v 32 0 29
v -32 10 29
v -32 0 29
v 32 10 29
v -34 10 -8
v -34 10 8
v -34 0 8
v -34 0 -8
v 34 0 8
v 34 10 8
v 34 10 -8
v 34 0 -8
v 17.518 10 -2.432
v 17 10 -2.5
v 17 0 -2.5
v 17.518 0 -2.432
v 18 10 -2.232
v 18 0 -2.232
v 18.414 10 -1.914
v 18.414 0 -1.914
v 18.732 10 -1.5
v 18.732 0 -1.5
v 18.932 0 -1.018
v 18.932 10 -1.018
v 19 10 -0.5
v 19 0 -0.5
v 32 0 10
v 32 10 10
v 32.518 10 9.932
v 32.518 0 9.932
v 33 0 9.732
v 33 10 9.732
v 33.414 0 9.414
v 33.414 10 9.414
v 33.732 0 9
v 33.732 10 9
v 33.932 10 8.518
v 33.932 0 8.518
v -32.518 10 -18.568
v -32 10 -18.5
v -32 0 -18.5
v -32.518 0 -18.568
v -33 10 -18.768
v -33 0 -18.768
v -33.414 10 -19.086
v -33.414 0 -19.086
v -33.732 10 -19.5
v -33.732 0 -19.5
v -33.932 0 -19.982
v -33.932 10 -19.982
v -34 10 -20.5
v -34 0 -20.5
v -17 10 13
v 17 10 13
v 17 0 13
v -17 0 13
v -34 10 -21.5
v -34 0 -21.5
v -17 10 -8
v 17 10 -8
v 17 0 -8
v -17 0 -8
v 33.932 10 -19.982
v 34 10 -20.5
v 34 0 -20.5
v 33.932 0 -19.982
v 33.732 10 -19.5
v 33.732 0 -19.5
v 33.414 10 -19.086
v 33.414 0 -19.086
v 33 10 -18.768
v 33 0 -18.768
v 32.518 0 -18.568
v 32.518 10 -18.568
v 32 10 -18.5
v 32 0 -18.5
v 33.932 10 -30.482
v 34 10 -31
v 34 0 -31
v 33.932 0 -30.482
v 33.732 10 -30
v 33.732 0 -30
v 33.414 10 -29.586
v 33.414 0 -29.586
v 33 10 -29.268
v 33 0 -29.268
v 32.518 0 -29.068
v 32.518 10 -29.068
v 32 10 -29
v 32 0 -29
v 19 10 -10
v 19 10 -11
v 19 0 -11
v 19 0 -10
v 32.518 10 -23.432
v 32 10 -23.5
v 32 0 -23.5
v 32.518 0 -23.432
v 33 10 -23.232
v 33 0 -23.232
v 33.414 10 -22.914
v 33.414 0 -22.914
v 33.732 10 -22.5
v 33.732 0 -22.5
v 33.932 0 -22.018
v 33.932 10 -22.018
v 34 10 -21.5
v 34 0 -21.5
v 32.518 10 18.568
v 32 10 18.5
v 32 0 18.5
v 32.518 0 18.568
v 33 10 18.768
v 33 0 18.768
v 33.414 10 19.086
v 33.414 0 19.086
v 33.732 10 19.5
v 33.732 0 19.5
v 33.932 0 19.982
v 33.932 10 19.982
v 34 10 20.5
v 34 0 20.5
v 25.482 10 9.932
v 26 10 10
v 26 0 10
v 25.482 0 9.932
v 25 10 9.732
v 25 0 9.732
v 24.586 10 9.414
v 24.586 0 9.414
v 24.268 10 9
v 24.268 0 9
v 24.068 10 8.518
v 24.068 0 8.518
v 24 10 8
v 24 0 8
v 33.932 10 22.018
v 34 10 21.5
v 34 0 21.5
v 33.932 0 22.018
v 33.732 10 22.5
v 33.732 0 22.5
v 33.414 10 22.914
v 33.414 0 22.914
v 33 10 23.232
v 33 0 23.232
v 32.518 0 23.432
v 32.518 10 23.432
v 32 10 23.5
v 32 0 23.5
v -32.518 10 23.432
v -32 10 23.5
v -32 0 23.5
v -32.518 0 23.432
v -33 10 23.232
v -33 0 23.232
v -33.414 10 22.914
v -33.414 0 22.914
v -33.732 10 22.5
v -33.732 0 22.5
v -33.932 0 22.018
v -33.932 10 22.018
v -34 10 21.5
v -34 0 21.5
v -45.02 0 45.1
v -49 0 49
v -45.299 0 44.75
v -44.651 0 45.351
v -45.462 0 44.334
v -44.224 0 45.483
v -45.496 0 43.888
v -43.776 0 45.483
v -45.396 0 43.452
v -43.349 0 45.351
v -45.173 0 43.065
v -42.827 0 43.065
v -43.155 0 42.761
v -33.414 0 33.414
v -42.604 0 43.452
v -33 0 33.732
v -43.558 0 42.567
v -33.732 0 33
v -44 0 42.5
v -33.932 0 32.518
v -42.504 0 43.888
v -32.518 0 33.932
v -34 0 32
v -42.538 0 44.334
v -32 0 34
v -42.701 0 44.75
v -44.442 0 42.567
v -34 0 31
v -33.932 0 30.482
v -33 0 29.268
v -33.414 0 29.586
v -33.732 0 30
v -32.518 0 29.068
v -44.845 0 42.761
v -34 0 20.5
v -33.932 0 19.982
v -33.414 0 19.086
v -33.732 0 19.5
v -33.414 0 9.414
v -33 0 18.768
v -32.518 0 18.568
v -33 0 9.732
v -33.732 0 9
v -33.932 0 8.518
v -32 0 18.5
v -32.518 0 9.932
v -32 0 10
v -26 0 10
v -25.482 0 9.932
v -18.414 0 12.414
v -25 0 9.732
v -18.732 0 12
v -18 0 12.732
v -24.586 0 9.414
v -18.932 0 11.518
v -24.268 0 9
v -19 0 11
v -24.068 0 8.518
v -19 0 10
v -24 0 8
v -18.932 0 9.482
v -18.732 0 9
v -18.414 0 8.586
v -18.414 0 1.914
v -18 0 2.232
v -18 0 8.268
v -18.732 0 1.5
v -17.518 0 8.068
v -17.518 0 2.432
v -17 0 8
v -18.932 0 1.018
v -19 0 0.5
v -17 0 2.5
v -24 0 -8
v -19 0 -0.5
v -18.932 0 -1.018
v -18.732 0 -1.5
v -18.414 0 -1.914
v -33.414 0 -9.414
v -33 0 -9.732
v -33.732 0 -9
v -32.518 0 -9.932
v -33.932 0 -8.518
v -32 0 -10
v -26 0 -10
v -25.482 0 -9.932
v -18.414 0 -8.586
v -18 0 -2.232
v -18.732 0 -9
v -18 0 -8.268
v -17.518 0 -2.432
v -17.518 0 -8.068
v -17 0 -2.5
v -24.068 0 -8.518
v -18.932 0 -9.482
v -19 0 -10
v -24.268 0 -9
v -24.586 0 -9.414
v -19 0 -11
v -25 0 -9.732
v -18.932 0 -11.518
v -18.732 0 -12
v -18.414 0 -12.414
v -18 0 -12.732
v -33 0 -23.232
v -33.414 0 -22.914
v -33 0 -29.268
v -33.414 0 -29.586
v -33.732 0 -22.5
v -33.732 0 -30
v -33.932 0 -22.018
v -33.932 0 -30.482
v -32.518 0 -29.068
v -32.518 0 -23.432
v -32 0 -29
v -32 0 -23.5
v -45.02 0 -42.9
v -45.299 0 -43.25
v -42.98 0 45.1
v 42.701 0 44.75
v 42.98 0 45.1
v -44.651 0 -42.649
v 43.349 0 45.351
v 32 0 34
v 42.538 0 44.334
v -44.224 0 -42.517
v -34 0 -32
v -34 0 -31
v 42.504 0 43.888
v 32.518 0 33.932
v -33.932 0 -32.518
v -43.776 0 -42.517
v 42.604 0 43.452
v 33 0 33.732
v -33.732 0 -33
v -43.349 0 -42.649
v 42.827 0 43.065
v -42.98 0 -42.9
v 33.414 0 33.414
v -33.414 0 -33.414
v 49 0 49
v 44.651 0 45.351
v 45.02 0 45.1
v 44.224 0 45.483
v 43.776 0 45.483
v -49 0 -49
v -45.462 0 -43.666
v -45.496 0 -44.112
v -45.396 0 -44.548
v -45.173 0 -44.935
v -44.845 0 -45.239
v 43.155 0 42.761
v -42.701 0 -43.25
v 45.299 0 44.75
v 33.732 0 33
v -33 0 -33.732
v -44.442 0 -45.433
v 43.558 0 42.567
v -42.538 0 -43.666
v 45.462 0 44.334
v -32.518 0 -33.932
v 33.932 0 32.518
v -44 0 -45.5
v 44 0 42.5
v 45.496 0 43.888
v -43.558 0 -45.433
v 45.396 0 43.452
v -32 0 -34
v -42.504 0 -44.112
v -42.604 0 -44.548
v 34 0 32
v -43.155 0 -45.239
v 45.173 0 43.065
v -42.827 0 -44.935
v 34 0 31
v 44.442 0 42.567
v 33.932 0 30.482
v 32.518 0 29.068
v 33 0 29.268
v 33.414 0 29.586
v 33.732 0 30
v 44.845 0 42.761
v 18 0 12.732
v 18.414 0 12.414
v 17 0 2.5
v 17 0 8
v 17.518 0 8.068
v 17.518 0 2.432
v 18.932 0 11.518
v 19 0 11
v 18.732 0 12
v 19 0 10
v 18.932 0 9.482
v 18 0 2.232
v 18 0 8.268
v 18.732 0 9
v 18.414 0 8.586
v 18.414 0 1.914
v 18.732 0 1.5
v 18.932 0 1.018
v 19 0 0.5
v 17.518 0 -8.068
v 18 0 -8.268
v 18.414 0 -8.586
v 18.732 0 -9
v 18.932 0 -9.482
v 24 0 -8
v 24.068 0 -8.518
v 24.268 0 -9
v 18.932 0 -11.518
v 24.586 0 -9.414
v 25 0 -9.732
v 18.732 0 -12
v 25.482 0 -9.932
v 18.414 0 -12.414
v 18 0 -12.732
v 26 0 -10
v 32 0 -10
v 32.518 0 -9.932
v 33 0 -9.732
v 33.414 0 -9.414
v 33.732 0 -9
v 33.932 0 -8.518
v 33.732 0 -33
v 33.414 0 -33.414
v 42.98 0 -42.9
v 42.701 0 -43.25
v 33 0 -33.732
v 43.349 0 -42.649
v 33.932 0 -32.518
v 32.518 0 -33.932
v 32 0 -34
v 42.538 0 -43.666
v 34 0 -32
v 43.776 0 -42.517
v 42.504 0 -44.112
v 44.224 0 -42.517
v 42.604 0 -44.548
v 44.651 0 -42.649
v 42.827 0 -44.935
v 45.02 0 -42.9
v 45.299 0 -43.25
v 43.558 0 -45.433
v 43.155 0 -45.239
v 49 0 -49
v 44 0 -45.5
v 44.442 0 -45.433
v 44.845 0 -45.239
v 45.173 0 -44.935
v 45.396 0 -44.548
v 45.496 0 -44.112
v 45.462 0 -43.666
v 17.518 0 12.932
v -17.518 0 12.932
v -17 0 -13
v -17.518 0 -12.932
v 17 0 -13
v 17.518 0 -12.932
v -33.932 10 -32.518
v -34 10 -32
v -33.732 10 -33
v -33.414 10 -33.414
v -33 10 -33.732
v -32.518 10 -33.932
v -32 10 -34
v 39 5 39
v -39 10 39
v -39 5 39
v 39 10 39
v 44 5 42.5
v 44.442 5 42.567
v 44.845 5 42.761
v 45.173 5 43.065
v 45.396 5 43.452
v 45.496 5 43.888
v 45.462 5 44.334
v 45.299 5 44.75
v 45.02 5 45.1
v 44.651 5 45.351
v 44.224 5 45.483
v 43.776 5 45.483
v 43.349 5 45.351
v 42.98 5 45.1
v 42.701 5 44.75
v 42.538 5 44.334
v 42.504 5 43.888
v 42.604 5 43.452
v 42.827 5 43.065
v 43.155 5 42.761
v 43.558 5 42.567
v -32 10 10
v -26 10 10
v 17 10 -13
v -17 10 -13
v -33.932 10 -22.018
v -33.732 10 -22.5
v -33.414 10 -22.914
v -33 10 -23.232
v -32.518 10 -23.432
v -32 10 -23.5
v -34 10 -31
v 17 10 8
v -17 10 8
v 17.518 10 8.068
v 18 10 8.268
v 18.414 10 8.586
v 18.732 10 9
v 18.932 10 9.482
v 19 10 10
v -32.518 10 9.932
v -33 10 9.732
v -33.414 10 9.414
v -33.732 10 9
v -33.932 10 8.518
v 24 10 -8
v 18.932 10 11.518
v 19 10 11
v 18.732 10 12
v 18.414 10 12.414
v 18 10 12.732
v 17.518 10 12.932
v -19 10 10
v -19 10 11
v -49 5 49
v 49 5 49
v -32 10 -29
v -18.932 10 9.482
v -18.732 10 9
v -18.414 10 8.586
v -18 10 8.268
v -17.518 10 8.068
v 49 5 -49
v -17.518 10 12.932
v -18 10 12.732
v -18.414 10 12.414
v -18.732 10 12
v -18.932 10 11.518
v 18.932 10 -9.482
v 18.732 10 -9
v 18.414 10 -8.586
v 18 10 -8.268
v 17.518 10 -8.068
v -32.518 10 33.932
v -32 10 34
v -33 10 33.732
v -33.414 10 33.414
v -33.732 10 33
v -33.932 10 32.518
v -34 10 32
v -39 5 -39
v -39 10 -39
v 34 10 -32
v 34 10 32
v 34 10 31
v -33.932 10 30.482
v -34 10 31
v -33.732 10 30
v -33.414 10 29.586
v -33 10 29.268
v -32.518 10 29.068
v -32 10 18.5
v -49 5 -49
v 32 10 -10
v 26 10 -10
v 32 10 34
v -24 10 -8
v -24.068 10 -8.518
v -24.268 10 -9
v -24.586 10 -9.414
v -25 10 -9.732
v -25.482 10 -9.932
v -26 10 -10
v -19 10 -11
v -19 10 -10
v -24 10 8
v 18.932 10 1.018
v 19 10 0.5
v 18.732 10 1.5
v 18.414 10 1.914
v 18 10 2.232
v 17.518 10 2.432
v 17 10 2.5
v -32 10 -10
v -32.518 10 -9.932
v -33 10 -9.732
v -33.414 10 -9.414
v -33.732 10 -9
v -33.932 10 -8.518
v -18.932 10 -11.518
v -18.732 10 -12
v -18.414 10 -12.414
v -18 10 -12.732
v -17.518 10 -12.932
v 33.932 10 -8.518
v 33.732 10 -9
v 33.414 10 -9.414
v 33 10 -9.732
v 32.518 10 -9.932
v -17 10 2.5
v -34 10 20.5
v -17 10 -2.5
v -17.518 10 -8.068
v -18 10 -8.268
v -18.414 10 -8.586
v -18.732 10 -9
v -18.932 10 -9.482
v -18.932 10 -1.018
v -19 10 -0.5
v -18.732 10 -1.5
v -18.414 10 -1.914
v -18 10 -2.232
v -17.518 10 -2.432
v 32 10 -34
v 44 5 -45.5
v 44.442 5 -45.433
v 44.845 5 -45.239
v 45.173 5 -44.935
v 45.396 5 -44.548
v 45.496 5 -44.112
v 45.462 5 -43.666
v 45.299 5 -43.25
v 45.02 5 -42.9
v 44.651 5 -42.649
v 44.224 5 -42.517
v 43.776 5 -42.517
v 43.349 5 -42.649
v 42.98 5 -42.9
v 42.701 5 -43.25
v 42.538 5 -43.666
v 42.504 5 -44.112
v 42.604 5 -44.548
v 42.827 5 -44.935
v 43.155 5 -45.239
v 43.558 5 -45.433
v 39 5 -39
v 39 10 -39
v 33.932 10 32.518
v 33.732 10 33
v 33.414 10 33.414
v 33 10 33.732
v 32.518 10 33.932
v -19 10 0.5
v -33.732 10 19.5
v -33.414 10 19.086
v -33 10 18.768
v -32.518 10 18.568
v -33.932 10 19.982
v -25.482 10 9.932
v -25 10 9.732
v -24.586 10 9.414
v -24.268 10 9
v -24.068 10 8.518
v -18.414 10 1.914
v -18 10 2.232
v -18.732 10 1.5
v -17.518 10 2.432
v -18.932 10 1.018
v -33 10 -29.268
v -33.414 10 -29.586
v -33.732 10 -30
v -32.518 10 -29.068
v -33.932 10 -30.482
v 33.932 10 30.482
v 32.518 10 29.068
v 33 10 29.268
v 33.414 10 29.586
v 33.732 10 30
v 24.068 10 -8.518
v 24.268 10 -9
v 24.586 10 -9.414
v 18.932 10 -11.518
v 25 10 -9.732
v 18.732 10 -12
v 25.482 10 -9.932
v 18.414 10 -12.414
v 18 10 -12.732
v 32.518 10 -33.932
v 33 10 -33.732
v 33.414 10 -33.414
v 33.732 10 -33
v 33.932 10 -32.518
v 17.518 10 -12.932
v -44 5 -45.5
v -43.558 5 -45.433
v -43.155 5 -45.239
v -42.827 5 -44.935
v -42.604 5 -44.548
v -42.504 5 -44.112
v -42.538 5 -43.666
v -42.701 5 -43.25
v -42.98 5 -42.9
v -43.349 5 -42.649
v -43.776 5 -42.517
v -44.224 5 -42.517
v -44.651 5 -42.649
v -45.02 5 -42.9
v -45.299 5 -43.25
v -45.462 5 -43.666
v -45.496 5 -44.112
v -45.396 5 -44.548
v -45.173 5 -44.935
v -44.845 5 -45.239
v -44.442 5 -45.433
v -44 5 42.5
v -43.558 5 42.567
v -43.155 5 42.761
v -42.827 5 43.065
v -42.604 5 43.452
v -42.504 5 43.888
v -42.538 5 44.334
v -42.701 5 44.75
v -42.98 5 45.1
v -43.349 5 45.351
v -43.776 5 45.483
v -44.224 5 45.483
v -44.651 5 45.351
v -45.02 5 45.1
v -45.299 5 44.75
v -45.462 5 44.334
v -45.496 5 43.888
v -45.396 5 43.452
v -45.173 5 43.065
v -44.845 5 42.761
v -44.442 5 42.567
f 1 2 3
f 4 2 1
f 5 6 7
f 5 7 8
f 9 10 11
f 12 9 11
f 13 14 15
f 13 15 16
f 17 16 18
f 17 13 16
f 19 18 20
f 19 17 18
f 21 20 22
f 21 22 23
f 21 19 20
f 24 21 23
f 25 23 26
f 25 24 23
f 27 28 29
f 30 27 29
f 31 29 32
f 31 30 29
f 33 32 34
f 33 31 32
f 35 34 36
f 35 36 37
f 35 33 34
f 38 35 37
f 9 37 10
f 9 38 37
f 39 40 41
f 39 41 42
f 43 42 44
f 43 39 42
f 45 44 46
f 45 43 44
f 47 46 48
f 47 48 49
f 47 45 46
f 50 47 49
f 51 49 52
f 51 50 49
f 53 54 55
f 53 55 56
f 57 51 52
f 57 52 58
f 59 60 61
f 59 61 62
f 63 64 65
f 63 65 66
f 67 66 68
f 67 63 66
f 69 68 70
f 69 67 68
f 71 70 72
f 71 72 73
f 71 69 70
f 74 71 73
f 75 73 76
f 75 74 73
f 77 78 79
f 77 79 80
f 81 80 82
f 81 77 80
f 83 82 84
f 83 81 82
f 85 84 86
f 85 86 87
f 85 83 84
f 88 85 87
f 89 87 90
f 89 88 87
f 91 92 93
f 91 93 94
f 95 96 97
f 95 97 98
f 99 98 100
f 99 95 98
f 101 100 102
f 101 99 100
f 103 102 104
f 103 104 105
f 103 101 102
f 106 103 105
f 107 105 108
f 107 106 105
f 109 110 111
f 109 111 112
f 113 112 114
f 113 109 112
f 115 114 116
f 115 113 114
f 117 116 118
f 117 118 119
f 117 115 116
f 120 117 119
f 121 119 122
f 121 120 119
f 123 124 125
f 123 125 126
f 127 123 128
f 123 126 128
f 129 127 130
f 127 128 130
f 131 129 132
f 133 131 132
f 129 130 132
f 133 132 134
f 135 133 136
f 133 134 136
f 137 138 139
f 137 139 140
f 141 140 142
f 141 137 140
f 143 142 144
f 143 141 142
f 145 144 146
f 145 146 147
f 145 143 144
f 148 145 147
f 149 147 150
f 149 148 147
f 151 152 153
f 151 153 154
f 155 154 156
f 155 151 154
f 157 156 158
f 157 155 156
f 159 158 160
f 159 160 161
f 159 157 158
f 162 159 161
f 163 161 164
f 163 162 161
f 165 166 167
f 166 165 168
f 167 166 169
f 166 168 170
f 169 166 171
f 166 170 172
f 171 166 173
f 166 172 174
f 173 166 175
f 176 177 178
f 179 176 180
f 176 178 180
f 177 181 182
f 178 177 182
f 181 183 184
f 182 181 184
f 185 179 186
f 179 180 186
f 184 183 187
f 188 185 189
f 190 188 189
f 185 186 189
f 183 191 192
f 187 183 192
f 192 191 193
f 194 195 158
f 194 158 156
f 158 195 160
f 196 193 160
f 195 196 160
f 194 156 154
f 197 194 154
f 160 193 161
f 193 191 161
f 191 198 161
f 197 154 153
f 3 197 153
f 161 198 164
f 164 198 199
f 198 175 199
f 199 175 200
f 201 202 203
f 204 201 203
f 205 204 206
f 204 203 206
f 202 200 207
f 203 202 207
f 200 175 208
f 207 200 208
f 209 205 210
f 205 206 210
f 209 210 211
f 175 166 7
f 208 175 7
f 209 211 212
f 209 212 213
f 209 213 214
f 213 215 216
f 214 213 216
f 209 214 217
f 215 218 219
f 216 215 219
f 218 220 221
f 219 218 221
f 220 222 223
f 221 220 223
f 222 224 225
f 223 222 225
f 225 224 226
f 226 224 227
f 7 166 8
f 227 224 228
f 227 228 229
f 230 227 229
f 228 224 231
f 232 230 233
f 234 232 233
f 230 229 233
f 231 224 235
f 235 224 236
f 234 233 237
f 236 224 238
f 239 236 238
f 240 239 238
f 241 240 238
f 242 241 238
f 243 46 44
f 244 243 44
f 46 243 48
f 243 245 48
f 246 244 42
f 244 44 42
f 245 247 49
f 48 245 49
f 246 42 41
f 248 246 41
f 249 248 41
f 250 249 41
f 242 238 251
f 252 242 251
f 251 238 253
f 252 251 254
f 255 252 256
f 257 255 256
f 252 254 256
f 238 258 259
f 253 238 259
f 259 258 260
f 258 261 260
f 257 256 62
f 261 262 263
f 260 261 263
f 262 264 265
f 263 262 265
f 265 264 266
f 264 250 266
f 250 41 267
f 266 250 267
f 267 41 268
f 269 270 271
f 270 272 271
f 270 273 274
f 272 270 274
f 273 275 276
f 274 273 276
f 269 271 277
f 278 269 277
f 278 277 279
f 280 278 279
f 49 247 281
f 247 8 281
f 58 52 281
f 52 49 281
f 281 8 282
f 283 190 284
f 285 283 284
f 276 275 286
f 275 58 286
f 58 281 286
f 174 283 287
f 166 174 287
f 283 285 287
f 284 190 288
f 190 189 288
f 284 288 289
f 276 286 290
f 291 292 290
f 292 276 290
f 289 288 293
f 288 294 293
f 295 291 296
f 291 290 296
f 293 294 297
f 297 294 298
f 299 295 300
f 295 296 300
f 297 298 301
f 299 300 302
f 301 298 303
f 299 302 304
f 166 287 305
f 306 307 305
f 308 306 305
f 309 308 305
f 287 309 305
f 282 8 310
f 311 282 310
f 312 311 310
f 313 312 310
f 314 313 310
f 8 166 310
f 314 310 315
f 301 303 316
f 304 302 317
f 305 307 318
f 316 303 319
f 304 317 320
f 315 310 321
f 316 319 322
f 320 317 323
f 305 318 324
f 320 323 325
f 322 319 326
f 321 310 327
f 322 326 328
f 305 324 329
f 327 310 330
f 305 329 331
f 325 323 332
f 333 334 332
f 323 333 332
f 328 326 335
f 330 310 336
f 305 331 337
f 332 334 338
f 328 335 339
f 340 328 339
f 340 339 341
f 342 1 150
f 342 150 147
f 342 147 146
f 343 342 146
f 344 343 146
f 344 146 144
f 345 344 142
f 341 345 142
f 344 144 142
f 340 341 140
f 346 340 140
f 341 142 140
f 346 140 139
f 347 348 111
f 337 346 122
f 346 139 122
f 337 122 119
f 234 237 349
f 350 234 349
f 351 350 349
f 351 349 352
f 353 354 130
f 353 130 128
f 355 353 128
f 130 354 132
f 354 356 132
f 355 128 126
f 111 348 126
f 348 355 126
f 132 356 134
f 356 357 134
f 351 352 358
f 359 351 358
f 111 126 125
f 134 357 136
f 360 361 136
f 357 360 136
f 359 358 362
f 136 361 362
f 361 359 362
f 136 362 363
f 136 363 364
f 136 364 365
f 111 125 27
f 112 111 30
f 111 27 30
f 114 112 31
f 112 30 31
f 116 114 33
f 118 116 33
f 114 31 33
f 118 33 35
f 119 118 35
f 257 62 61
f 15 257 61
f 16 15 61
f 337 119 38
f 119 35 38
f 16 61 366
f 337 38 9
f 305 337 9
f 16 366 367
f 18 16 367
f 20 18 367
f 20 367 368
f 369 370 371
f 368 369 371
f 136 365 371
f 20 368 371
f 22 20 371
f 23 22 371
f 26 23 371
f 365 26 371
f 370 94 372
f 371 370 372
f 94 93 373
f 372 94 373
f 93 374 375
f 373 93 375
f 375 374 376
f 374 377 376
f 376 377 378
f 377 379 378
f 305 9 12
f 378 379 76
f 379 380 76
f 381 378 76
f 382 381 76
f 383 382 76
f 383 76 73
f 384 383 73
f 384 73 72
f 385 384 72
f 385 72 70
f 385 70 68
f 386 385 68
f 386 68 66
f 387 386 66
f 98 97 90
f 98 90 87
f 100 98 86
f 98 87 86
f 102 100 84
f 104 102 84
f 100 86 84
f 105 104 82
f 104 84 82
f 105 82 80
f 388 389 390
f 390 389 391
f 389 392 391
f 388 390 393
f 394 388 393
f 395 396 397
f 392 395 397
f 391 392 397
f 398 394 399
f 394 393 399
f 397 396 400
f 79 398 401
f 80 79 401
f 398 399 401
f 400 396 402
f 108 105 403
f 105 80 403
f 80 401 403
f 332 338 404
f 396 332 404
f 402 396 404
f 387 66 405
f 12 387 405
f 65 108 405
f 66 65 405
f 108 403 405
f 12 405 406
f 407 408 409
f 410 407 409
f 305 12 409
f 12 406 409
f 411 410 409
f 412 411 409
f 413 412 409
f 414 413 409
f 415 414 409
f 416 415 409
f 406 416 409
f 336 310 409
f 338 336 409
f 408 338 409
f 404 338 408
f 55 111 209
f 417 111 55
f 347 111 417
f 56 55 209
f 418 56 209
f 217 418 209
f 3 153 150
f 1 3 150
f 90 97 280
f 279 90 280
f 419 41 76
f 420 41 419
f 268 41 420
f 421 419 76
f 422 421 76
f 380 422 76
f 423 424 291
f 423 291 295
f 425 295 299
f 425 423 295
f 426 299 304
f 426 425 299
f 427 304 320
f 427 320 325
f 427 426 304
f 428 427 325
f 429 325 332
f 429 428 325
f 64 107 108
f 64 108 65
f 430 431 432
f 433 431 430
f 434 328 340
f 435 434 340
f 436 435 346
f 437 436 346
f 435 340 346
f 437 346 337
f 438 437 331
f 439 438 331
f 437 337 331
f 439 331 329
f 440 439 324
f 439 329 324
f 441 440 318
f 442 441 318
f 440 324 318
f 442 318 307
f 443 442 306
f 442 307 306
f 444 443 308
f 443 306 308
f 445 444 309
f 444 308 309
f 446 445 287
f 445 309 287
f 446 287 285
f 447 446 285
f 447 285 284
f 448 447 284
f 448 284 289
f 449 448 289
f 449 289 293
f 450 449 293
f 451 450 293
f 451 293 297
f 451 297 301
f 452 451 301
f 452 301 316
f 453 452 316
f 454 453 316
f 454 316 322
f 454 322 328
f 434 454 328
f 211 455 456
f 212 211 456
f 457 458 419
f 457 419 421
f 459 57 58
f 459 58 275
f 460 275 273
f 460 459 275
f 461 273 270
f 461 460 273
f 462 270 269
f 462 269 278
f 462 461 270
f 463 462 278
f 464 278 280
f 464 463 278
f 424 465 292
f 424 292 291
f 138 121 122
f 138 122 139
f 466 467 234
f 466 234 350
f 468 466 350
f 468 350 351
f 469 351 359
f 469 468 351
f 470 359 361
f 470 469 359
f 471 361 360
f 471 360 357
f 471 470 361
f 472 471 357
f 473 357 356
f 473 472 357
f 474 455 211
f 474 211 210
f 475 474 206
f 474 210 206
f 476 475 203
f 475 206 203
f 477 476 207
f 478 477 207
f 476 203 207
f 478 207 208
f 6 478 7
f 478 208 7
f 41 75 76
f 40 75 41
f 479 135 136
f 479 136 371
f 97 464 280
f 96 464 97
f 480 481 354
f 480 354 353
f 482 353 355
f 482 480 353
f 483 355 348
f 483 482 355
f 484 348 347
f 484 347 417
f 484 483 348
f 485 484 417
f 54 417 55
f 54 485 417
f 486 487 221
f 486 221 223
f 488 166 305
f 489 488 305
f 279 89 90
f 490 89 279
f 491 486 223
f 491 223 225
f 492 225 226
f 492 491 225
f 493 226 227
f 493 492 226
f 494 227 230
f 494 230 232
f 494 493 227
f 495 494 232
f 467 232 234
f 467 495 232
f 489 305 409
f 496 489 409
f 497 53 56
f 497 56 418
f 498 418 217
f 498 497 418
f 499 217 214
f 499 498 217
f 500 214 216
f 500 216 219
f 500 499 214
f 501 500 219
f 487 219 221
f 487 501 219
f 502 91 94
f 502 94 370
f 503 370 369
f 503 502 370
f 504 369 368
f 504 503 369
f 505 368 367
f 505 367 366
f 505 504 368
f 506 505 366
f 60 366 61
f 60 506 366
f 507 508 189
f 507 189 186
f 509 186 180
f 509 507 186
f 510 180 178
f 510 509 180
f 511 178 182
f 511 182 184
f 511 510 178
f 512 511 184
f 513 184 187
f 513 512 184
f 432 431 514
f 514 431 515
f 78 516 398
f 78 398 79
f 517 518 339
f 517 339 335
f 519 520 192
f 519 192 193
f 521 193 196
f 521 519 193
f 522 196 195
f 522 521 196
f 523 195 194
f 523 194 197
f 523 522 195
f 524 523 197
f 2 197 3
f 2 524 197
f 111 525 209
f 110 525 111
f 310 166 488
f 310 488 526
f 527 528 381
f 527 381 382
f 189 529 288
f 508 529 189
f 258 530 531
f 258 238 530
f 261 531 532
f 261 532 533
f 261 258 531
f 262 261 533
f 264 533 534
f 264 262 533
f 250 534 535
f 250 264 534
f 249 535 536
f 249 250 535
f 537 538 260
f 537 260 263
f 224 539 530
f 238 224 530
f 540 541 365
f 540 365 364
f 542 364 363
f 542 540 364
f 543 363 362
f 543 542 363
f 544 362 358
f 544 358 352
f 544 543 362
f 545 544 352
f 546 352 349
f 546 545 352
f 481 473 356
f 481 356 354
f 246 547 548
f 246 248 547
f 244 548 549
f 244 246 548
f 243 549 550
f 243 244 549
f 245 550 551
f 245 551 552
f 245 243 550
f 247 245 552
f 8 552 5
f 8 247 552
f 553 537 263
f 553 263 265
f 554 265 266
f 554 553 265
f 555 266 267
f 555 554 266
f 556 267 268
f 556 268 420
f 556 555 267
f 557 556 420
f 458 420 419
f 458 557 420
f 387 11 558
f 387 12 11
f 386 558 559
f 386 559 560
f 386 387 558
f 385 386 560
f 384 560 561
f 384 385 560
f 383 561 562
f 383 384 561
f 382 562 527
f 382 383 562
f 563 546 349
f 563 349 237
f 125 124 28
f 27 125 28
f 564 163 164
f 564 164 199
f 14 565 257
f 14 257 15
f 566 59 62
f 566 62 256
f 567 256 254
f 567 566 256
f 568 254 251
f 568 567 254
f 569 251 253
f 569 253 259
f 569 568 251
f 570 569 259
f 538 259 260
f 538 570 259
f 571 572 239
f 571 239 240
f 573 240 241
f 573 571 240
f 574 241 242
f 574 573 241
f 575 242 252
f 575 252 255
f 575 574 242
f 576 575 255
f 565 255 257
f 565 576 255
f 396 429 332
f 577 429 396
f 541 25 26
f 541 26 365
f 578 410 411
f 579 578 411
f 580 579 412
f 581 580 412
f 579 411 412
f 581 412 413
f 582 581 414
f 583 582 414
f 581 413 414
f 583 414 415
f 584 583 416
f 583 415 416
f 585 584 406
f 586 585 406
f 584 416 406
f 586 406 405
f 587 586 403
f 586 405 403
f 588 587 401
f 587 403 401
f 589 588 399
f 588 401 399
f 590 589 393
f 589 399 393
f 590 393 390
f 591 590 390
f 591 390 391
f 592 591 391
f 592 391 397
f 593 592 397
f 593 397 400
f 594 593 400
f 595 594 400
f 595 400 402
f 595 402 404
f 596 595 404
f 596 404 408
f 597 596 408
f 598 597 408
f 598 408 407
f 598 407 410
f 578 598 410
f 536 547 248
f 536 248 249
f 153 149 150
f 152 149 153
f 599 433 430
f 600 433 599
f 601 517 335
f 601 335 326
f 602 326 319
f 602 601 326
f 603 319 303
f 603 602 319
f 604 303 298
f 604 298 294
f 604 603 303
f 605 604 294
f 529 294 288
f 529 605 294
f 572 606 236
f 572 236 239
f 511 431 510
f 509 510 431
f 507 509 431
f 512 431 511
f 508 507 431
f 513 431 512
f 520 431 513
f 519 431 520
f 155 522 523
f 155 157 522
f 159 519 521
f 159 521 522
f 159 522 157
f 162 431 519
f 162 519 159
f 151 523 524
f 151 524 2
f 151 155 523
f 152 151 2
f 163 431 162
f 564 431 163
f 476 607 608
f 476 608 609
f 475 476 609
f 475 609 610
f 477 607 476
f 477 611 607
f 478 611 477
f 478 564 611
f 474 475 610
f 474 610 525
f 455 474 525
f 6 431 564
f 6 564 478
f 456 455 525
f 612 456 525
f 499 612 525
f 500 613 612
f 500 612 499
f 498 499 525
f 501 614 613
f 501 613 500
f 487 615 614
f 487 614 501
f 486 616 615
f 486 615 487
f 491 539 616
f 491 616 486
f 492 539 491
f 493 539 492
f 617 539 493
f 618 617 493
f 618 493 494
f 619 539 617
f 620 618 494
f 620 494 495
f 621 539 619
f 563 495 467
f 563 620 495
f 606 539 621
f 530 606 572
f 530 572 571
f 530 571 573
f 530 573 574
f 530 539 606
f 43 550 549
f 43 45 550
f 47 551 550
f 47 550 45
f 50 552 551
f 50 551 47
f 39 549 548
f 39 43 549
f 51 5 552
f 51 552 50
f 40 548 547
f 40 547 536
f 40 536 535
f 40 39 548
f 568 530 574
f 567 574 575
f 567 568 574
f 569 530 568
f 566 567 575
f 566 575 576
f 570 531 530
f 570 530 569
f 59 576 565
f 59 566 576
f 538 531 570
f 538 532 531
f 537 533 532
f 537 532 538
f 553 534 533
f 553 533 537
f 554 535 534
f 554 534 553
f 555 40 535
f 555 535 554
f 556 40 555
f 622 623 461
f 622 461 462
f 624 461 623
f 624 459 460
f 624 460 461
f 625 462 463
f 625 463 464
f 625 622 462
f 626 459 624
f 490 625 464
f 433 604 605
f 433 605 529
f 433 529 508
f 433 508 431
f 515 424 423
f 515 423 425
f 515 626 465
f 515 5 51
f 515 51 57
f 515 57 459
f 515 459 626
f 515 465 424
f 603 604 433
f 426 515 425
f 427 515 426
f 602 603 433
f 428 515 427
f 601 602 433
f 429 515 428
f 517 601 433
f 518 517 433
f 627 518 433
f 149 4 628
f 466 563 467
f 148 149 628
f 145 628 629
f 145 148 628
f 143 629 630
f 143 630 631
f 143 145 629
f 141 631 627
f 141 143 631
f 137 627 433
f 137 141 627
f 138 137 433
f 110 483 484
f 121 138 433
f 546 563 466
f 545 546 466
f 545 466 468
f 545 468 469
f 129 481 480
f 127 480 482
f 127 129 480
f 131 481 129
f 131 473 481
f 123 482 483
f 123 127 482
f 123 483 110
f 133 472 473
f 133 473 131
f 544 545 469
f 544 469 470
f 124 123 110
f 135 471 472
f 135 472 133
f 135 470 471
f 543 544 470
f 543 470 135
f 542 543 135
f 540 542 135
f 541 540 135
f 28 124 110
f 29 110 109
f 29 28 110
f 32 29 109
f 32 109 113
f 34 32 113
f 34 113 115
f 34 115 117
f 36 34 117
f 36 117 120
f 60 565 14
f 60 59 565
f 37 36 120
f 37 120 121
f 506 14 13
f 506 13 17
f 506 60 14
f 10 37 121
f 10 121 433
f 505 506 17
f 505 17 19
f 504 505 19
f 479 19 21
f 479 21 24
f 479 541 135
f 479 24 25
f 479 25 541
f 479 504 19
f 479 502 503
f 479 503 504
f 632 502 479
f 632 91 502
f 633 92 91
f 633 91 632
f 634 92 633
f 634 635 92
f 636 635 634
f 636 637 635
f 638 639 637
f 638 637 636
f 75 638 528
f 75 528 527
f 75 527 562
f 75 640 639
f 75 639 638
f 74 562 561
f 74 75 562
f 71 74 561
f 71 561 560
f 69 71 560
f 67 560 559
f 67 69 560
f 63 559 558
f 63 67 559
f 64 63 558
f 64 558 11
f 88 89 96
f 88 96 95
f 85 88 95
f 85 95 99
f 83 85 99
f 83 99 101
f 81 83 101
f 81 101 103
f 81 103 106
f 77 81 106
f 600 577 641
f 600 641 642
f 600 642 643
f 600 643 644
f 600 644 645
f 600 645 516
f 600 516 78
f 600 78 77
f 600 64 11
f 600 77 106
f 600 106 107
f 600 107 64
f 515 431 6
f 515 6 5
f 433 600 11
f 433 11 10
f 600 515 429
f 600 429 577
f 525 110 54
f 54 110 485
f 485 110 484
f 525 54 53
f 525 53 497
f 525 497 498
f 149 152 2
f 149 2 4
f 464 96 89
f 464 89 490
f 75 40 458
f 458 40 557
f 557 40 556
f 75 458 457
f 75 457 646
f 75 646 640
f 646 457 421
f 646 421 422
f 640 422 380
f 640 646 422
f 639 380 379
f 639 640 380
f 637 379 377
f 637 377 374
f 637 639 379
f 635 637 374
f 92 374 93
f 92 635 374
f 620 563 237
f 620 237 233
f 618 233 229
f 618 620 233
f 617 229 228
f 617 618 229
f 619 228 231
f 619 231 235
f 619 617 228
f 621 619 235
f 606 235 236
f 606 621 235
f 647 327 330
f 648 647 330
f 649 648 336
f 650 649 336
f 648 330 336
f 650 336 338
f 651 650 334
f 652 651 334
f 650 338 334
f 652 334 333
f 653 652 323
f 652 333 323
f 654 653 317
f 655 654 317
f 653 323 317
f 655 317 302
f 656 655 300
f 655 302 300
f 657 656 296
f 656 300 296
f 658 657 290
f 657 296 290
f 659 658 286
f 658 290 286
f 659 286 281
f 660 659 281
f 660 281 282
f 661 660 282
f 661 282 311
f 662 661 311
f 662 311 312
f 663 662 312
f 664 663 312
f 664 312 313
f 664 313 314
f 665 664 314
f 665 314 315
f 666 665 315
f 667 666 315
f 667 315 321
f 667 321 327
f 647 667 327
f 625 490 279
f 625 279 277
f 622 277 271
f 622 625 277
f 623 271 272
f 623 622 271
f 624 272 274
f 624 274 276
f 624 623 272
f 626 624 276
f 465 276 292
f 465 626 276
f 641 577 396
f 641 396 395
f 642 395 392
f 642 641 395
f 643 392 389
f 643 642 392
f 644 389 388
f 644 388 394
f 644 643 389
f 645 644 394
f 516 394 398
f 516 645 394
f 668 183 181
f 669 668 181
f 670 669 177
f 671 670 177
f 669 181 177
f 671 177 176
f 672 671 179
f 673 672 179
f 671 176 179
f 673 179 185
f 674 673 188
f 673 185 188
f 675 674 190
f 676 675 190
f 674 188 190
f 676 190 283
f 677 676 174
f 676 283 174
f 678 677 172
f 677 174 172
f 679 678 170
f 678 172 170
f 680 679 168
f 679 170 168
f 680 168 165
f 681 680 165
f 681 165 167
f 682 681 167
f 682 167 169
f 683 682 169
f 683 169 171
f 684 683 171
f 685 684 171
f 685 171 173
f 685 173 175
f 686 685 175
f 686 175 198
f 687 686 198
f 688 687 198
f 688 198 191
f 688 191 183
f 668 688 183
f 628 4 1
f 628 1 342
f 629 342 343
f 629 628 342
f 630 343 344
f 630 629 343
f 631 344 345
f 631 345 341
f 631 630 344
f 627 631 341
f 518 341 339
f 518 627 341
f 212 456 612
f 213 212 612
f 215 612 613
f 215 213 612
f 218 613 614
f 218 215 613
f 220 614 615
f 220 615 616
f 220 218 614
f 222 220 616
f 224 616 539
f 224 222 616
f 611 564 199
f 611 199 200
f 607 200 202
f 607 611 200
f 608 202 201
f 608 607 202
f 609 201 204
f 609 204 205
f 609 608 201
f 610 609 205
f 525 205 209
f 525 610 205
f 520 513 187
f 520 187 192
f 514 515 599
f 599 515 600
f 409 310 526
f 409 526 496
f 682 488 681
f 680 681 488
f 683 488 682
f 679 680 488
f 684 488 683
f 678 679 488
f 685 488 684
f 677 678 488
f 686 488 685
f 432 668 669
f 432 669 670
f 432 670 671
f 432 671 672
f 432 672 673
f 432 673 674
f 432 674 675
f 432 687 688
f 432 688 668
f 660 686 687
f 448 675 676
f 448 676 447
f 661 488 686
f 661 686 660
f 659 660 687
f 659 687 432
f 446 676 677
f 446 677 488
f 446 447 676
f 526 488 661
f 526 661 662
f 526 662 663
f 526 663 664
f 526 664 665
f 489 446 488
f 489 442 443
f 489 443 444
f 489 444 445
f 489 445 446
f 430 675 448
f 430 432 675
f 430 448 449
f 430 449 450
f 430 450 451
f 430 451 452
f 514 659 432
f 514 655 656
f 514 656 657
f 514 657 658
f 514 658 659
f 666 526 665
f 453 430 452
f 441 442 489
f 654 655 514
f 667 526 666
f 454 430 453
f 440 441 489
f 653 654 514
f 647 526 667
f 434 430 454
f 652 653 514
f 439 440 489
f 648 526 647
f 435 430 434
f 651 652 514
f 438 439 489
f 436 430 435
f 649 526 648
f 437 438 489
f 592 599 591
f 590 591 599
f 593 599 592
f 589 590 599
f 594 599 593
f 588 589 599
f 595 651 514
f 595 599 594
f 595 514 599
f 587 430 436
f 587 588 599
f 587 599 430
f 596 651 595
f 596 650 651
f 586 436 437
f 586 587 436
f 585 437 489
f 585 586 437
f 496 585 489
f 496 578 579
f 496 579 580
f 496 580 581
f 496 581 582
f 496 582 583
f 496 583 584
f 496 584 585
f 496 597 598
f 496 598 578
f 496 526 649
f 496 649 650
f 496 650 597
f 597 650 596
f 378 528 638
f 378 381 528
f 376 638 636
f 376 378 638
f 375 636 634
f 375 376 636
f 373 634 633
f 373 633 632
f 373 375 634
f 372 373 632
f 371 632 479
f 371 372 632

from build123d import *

# Parameters (mm, degrees)
SKETCH1_W           = 98
SKETCH1_H           = 98
BOSS_EXTRUDE1_DEPTH = 10
SKETCH8_W           = 98
SKETCH8_H           = 98
SKETCH8_W_2         = 78
SKETCH8_H_2         = 78
CUT_EXTRUDE5_DEPTH  = 5
SKETCH14_R          = 1.5
CUT_EXTRUDE11_DEPTH = 10
SKETCH15_W          = 10
SKETCH15_H          = 20
CUT_EXTRUDE19_DEPTH = 10
FILLET1_R           = 2


with BuildPart() as part:
    # Sketch1 → Boss-Extrude1 (new body)
    with BuildSketch(Plane(origin=(0, 0, 0), x_dir=(1, 0, 0), z_dir=(0, 1, 0))):
        Rectangle(SKETCH1_W, SKETCH1_H)
    extrude(amount=BOSS_EXTRUDE1_DEPTH)

    # Sketch8 → Cut-Extrude5 (cut)
    with BuildSketch(Plane(origin=(0, 10, 0), x_dir=(1, 0, 0), z_dir=(0, 1, 0))):
        Rectangle(SKETCH8_W, SKETCH8_H)
        Rectangle(SKETCH8_W_2, SKETCH8_H_2, mode=Mode.SUBTRACT)
    extrude(amount=-CUT_EXTRUDE5_DEPTH, mode=Mode.SUBTRACT)

    # Sketch14 → Cut-Extrude11 (cut)
    with BuildSketch(Plane.XZ):
        with Locations(Location((-44, -44, 0), (0, 0, 270))):
            Circle(SKETCH14_R)
        with Locations(Location((-44, 44, 0), (0, 0, 270))):
            Circle(SKETCH14_R)
        with Locations(Location((44, 44, 0), (0, 0, 270))):
            Circle(SKETCH14_R)
        with Locations(Location((44, -44, 0), (0, 0, 270))):
            Circle(SKETCH14_R)
    extrude(amount=-CUT_EXTRUDE11_DEPTH, mode=Mode.SUBTRACT)

    # Sketch15 → Cut-Extrude19 (cut)
    with BuildSketch(Plane(origin=(0, 10, 0), x_dir=(1, 0, 0), z_dir=(0, 1, 0))):
        with BuildLine():
            ThreePointArc((-34, 32), (-33.414213562, 33.414213562), (-32, 34))
            Line((-32, 34), (32, 34))
            ThreePointArc((32, 34), (33.414213562, 33.414213562), (34, 32))
            Line((34, 32), (34, 31))
            ThreePointArc((34, 31), (33.414213562, 29.585786438), (32, 29))
            Line((32, 29), (14, 29))
            Line((14, 29), (-14, 29))
            Line((-14, 29), (-32, 29))
            ThreePointArc((-32, 29), (-33.414213562, 29.585786438), (-34, 31))
            Line((-34, 31), (-34, 32))
        make_face()
        with BuildLine():
            ThreePointArc((-34, 21.5), (-33.414213562, 22.914213562), (-32, 23.5))
            Line((-32, 23.5), (-14, 23.5))
            Line((-14, 23.5), (14, 23.5))
            Line((14, 23.5), (32, 23.5))
            ThreePointArc((32, 23.5), (33.414213562, 22.914213562), (34, 21.5))
            Line((34, 21.5), (34, 20.5))
            ThreePointArc((34, 20.5), (33.414213562, 19.085786438), (32, 18.5))
            Line((32, 18.5), (14, 18.5))
            Line((14, 18.5), (-14, 18.5))
            Line((-14, 18.5), (-32, 18.5))
            ThreePointArc((-32, 18.5), (-33.414213562, 19.085786438), (-34, 20.5))
            Line((-34, 20.5), (-34, 21.5))
        make_face()
        with BuildLine():
            ThreePointArc((-19, 11), (-18.414213562, 12.414213562), (-17, 13))
            Line((-17, 13), (-14, 13))
            Line((-14, 13), (14, 13))
            Line((14, 13), (17, 13))
            ThreePointArc((17, 13), (18.414213562, 12.414213562), (19, 11))
            Line((19, 11), (19, 10))
            ThreePointArc((19, 10), (18.414213562, 8.585786438), (17, 8))
            Line((17, 8), (14, 8))
            Line((14, 8), (-14, 8))
            Line((-14, 8), (-17, 8))
            ThreePointArc((-17, 8), (-18.414213562, 8.585786438), (-19, 10))
            Line((-19, 10), (-19, 11))
        make_face()
        with BuildLine():
            ThreePointArc((-19, 0.5), (-18.414213562, 1.914213562), (-17, 2.5))
            Line((-17, 2.5), (-14, 2.5))
            Line((-14, 2.5), (14, 2.5))
            Line((14, 2.5), (17, 2.5))
            ThreePointArc((17, 2.5), (18.414213562, 1.914213562), (19, 0.5))
            Line((19, 0.5), (19, -0.5))
            ThreePointArc((19, -0.5), (18.414213562, -1.914213562), (17, -2.5))
            Line((17, -2.5), (14, -2.5))
            Line((14, -2.5), (-14, -2.5))
            Line((-14, -2.5), (-17, -2.5))
            ThreePointArc((-17, -2.5), (-18.414213562, -1.914213562), (-19, -0.5))
            Line((-19, -0.5), (-19, 0.5))
        make_face()
        with BuildLine():
            ThreePointArc((-19, -10), (-18.414213562, -8.585786438), (-17, -8))
            Line((-17, -8), (-14, -8))
            Line((-14, -8), (14, -8))
            Line((14, -8), (17, -8))
            ThreePointArc((17, -8), (18.414213562, -8.585786438), (19, -10))
            Line((19, -10), (19, -11))
            ThreePointArc((19, -11), (18.414213562, -12.414213562), (17, -13))
            Line((17, -13), (14, -13))
            Line((14, -13), (-14, -13))
            Line((-14, -13), (-17, -13))
            ThreePointArc((-17, -13), (-18.414213562, -12.414213562), (-19, -11))
            Line((-19, -11), (-19, -10))
        make_face()
        with BuildLine():
            ThreePointArc((32, -18.5), (33.414213562, -19.085786438), (34, -20.5))
            Line((34, -20.5), (34, -21.5))
            ThreePointArc((34, -21.5), (33.414213562, -22.914213562), (32, -23.5))
            Line((32, -23.5), (14, -23.5))
            Line((14, -23.5), (-14, -23.5))
            Line((-14, -23.5), (-32, -23.5))
            ThreePointArc((-32, -23.5), (-33.414213562, -22.914213562), (-34, -21.5))
            Line((-34, -21.5), (-34, -20.5))
            ThreePointArc((-34, -20.5), (-33.414213562, -19.085786438), (-32, -18.5))
            Line((-32, -18.5), (-14, -18.5))
            Line((-14, -18.5), (14, -18.5))
            Line((14, -18.5), (32, -18.5))
        make_face()
        with BuildLine():
            ThreePointArc((32, -29), (33.414213562, -29.585786438), (34, -31))
            Line((34, -31), (34, -32))
            ThreePointArc((34, -32), (33.414213562, -33.414213562), (32, -34))
            Line((32, -34), (-32, -34))
            ThreePointArc((-32, -34), (-33.414213562, -33.414213562), (-34, -32))
            Line((-34, -32), (-34, -31))
            ThreePointArc((-34, -31), (-33.414213562, -29.585786438), (-32, -29))
            Line((-32, -29), (-14, -29))
            Line((-14, -29), (14, -29))
            Line((14, -29), (32, -29))
        make_face()
        with Locations((-29, 0)):
            Rectangle(SKETCH15_W, SKETCH15_H)
        with Locations((29, 0)):
            Rectangle(SKETCH15_W, SKETCH15_H)
    extrude(amount=-CUT_EXTRUDE19_DEPTH, mode=Mode.SUBTRACT)

    # Fillet1
    fillet1_edges = [part.edges().sort_by_distance(p)[0] for p in [
        (34, 5, -10),
        (34, 5, 10),
        (24, 5, 10),
        (24, 5, -10),
        (-34, 5, -10),
        (-24, 5, -10),
        (-24, 5, 10),
        (-34, 5, 10),
    ]]
    fillet(fillet1_edges, radius=FILLET1_R)


solid = part.part
